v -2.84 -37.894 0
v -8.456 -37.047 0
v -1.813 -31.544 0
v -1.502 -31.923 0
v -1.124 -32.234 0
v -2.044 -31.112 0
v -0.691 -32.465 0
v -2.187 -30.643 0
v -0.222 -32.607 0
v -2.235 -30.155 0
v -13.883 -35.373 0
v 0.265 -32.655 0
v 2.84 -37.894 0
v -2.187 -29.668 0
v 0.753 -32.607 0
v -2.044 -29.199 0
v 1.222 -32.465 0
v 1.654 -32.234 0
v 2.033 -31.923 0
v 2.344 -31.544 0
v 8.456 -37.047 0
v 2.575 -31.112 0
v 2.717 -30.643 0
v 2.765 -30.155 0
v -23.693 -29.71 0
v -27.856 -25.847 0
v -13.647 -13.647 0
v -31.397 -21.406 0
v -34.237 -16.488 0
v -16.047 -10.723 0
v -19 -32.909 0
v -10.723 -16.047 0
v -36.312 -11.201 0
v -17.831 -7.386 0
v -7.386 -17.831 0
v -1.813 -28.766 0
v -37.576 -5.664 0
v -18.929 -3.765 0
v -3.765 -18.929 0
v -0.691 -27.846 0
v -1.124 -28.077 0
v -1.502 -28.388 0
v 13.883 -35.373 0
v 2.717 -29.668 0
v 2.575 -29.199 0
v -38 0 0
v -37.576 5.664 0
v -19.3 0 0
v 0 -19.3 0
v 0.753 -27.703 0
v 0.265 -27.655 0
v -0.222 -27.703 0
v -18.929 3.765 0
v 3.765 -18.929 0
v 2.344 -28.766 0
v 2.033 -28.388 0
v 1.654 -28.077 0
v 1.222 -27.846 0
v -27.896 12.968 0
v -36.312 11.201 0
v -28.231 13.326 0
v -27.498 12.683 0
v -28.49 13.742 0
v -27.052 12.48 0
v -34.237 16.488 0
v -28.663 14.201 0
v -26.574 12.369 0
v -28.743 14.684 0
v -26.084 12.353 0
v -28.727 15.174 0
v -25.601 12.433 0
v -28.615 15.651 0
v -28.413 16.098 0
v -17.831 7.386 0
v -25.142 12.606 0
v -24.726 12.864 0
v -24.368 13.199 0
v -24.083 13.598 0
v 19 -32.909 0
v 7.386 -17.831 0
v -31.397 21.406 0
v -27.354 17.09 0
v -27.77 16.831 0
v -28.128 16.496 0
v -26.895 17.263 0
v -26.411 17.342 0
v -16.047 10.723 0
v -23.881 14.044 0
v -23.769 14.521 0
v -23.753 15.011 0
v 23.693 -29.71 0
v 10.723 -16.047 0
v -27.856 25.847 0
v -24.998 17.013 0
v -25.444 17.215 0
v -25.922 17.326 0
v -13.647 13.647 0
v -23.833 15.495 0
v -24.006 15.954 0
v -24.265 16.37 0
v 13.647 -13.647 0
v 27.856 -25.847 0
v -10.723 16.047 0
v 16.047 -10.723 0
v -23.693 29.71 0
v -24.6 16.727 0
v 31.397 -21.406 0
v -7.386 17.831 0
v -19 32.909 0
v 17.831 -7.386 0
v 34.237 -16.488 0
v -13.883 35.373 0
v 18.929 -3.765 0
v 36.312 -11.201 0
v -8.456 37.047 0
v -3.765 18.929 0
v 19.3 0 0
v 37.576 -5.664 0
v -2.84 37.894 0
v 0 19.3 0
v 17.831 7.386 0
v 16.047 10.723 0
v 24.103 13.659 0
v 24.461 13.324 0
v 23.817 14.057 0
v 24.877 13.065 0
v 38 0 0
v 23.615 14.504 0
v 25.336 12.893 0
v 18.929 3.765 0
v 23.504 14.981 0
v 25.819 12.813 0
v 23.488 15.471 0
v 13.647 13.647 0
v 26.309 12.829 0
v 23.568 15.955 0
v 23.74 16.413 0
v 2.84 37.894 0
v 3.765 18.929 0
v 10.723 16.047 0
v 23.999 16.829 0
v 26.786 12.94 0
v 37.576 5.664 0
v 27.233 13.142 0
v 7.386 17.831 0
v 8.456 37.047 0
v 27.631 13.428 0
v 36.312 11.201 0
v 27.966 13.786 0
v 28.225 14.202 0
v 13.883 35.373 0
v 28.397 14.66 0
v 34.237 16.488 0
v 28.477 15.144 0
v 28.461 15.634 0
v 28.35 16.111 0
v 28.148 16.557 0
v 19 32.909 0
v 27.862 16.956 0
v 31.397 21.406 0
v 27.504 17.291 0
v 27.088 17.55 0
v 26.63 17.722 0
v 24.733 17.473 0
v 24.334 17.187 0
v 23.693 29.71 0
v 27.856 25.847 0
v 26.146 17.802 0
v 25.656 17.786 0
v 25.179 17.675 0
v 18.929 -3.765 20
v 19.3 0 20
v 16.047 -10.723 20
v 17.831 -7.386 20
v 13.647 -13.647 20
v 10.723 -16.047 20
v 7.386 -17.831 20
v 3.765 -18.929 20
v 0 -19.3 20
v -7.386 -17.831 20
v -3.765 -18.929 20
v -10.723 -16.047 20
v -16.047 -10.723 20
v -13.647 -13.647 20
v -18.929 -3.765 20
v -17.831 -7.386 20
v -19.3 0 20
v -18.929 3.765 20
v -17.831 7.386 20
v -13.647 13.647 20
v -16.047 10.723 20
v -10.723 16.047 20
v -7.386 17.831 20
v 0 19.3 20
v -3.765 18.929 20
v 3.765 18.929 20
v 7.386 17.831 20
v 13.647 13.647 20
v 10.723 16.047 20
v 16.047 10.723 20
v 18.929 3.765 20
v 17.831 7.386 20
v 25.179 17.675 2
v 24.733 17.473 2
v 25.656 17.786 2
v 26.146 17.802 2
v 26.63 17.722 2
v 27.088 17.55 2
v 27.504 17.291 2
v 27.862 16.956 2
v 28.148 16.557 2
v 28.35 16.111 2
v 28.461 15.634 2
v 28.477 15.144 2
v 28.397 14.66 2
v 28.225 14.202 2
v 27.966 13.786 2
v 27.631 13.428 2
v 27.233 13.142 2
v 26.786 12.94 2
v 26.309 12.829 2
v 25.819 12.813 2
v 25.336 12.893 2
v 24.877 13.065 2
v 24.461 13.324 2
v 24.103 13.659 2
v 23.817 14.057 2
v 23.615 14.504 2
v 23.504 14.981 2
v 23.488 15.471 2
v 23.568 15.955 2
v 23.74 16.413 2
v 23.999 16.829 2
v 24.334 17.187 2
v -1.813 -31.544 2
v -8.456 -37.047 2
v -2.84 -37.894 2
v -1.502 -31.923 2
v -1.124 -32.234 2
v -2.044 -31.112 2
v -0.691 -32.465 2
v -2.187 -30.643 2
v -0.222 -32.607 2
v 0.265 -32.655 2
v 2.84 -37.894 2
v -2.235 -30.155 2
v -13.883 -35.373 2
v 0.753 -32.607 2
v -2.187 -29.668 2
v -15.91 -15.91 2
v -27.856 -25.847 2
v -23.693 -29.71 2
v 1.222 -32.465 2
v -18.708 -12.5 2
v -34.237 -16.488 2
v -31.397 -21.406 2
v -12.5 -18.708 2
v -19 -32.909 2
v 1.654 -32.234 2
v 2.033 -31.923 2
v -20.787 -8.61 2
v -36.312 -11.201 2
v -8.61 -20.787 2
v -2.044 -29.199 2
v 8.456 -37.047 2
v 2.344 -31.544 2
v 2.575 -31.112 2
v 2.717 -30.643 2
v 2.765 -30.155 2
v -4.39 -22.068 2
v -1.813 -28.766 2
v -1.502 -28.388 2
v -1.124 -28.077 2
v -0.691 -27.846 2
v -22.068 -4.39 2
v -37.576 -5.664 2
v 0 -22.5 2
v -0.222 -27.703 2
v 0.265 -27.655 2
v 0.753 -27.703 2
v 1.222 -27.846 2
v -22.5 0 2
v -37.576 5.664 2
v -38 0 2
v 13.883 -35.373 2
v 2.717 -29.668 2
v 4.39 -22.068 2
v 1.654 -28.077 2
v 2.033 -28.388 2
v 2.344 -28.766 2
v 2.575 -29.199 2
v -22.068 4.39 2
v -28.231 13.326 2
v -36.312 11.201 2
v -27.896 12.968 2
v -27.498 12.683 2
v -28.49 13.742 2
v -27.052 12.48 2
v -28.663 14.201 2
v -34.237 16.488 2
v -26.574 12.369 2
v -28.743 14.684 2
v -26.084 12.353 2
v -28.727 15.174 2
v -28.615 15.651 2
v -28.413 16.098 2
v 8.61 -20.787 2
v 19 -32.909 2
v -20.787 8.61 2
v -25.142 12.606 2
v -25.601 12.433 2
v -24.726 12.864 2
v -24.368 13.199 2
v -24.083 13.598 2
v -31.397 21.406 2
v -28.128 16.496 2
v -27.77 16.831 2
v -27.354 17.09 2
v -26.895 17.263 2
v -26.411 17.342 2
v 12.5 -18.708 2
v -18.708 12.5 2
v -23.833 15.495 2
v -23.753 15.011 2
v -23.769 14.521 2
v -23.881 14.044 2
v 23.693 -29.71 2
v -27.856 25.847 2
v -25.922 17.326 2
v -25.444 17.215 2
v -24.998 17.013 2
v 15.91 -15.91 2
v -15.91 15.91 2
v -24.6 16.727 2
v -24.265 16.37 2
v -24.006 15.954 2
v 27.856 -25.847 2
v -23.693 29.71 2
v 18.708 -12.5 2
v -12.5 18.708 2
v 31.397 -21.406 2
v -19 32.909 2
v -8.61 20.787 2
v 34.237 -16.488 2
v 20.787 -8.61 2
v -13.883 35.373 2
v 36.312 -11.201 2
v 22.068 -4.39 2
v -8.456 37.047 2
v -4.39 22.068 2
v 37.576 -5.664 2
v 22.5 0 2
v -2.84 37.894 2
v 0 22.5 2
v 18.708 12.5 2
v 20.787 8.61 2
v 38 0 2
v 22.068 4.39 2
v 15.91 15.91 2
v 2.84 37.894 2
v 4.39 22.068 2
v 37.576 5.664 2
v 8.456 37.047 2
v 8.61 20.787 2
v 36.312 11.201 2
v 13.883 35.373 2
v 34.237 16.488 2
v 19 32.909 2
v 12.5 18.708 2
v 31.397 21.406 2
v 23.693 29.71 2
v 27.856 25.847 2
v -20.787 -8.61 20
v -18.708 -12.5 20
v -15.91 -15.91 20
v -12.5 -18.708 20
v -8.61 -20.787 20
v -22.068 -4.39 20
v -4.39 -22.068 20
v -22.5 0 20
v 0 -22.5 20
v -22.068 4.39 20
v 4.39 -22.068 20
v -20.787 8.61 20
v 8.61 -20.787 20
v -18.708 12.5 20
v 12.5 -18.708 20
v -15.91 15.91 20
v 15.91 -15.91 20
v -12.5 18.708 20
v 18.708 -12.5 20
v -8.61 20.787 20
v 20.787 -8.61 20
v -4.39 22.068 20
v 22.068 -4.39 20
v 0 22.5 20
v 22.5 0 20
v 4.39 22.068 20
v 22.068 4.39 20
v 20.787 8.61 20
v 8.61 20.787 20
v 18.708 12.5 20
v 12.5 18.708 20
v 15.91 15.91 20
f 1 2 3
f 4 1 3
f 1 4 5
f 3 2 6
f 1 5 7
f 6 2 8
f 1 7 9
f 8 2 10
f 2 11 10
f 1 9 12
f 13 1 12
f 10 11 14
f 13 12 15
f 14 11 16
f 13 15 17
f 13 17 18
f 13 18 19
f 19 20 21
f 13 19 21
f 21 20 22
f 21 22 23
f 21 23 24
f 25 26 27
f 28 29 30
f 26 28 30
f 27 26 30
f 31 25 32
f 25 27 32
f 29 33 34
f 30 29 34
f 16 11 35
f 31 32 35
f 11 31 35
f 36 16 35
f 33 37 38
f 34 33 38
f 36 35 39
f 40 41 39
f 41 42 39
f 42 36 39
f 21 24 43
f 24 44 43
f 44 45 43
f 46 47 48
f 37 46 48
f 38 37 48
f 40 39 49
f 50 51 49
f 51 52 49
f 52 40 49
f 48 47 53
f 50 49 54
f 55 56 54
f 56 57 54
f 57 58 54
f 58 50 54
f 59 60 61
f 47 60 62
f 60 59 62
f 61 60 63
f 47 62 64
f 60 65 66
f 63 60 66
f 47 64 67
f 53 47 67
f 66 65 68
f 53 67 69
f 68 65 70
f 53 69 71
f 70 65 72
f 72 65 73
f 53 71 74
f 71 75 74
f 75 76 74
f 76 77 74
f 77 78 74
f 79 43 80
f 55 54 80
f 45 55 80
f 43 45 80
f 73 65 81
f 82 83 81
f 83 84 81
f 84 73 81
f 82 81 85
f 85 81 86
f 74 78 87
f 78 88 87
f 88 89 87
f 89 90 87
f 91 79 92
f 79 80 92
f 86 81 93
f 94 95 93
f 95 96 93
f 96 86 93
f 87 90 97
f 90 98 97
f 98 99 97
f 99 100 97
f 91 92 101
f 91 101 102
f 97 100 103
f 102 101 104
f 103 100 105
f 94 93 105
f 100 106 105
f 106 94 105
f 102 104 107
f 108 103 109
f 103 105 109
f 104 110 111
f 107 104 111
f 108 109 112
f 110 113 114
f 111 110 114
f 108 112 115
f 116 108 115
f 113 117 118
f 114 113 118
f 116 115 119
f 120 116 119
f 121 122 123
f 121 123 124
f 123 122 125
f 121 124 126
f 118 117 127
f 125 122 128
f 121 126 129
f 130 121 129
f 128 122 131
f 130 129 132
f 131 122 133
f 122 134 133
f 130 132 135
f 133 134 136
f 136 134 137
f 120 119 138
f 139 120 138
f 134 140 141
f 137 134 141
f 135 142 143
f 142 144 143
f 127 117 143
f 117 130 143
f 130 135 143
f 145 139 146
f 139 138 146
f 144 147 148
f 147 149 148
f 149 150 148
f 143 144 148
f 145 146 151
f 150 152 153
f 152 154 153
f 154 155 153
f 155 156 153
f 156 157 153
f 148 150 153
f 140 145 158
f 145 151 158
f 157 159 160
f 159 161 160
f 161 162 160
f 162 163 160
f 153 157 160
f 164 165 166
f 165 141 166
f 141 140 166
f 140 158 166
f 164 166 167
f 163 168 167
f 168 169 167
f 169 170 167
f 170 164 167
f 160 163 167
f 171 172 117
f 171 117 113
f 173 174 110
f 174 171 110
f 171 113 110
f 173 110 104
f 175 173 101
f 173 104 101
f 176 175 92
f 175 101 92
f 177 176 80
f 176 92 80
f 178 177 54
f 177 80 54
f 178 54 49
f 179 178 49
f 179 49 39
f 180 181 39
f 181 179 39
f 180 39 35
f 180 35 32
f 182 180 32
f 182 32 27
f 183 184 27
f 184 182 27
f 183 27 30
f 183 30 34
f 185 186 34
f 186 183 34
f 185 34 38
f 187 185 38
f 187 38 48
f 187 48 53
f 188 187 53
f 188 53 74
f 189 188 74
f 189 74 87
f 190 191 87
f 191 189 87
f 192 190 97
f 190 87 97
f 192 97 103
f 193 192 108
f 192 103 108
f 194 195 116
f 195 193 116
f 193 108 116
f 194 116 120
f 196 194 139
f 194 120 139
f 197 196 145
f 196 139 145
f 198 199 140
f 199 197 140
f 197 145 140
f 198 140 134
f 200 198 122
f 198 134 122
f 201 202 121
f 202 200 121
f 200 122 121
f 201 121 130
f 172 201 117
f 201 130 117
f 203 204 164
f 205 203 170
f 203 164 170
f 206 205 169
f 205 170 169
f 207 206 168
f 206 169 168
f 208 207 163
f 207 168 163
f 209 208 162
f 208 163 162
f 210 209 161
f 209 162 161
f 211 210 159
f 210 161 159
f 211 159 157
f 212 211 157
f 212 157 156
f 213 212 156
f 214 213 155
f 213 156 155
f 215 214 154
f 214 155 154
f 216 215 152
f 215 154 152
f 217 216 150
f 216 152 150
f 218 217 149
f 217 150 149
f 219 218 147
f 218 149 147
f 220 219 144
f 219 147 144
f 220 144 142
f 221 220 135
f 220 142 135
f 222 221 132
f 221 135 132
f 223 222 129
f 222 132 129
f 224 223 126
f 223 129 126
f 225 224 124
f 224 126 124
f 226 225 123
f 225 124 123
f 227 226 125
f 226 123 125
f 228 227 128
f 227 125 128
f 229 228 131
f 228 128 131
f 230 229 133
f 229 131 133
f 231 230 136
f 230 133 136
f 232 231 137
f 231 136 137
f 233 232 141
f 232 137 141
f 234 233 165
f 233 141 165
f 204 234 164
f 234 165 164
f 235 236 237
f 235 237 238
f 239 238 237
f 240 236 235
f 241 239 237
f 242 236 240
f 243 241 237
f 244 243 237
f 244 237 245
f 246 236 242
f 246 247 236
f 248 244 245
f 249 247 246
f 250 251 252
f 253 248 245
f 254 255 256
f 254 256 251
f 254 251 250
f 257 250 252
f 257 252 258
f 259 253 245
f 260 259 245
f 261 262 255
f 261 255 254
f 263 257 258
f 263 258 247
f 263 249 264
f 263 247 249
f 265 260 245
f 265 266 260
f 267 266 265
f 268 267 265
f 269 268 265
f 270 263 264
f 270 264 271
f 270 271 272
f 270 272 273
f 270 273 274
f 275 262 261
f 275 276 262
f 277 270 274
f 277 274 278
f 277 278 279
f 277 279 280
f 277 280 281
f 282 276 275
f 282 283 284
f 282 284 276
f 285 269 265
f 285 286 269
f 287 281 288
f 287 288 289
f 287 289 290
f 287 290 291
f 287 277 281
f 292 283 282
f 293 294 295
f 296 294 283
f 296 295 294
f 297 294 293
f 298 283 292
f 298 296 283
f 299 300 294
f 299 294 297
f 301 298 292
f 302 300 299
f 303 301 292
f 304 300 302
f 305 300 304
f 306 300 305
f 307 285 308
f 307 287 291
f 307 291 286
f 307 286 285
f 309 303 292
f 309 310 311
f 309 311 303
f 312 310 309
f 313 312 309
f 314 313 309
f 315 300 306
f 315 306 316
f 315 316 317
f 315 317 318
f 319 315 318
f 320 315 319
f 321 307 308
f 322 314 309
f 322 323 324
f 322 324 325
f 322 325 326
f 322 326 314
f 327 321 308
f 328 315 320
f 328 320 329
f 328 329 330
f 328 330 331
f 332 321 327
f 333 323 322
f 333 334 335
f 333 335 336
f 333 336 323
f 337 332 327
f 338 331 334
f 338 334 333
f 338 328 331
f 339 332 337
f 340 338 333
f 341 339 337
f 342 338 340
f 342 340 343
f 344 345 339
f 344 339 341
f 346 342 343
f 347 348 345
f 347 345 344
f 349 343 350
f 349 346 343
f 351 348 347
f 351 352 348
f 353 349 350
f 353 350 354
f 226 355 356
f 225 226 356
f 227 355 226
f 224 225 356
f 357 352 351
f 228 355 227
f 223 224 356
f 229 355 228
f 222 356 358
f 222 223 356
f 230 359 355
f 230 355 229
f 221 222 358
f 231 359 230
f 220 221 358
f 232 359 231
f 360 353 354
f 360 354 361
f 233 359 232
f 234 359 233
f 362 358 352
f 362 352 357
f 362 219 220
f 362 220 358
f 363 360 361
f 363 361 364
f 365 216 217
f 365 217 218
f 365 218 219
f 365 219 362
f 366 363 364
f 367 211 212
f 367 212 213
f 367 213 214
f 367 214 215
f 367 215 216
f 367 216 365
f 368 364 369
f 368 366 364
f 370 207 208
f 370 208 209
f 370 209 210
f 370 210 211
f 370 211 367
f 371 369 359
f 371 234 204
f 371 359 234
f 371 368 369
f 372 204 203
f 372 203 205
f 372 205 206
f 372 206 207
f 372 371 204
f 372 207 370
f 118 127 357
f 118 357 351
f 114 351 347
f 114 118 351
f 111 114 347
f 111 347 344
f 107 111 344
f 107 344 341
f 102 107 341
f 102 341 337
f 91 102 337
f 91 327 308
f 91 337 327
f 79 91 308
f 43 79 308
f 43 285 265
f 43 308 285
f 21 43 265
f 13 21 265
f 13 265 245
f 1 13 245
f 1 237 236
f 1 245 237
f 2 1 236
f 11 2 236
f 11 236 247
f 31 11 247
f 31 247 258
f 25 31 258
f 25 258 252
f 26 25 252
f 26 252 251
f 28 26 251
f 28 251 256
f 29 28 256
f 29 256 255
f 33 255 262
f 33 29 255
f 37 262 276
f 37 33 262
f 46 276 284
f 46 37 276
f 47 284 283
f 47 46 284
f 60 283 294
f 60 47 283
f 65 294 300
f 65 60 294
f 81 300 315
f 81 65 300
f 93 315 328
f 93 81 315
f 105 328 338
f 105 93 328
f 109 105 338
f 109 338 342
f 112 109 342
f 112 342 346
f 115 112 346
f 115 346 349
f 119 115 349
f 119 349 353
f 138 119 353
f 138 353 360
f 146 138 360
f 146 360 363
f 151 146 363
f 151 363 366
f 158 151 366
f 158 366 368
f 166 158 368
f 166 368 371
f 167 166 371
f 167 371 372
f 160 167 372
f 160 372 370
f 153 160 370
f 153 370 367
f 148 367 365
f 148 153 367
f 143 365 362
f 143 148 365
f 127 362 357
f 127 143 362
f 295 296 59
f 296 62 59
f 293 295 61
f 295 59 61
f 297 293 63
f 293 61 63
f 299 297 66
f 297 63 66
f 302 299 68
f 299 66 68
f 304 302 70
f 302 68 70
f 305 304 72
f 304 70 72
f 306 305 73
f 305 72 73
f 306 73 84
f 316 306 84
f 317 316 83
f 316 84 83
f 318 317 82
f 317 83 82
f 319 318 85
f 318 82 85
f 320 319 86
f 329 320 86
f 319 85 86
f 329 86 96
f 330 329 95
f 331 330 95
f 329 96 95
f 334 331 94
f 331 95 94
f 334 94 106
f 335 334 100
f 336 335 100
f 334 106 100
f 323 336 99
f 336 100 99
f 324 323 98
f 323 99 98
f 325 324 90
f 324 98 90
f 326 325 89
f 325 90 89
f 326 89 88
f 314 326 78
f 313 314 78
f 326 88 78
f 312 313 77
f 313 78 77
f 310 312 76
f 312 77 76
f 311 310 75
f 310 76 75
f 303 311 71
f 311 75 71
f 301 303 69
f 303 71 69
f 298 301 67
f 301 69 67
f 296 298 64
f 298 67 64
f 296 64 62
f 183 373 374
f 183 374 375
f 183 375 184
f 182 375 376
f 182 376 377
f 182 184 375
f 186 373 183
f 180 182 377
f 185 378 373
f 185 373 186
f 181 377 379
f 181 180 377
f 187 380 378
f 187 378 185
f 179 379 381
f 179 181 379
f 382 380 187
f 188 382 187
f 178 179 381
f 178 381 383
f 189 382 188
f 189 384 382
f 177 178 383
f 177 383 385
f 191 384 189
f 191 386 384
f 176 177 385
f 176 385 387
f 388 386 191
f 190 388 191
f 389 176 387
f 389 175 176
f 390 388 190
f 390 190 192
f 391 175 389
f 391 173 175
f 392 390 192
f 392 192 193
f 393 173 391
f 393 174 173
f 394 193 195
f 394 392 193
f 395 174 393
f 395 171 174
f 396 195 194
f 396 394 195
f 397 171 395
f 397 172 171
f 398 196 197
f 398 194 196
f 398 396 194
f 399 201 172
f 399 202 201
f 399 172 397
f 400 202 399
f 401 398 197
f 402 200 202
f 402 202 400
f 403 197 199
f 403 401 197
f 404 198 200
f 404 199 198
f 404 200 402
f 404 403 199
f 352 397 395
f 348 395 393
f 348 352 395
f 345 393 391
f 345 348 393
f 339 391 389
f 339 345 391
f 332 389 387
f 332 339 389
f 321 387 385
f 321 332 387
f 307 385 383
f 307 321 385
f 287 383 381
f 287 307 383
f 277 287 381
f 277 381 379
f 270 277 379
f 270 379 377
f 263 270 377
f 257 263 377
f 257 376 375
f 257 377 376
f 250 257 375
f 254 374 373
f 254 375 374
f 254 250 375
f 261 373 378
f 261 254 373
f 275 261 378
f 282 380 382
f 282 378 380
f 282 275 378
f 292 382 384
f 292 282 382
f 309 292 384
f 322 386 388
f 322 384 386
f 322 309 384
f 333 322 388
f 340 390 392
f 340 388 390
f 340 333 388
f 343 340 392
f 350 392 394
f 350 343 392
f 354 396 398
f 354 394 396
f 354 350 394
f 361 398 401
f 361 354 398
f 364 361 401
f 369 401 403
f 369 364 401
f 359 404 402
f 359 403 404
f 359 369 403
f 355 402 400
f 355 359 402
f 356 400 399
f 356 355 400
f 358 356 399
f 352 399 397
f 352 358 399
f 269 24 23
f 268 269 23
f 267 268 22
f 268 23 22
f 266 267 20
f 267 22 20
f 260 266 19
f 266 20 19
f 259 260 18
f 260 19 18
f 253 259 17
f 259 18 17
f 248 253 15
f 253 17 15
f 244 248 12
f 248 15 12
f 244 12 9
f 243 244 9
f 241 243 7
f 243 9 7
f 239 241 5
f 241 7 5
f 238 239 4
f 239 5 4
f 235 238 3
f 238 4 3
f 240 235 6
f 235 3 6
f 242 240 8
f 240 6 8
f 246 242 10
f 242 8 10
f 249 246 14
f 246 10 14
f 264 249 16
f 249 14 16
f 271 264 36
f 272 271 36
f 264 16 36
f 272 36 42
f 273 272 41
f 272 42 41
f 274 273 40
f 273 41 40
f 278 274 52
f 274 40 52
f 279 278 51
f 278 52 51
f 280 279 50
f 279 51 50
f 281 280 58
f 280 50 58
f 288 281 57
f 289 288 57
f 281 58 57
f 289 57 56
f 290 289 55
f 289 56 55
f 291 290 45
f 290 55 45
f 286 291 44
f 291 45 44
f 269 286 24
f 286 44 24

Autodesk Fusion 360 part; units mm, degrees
sketch "Sketch1" plane through (0, 0, 0) normal (0, 0, 1) x (1, 0, 0)
  circle A0 centre (0, 0) radius 19.3
  circle A1 centre (0, 0) radius 22.5
  circle A2 centre (0, 0) radius 38
  dimension "d1" = 45
  dimension "d2" = 38.6
  dimension "d3" = 76
extrude "Extrude1" add sketch "Sketch1" along normal blind 20 contours A1
sketch "Sketch2" plane through (0, 0, 0) normal (0, 0, 1) x (1, 0, 0)
  circle A0 centre (0.2654, -30.1553) radius 2.5
  dimension "d8" = 5
extrude "Extrude4" add sketch "Sketch1" along normal blind 2 contours A1 | A2
extrude "Extrude5" cut sketch "Sketch2" along normal blind 6.312
pattern_circular "C-Pattern2" count 3 over 360 about axis through (0, 0, 2) along (0, 0, 1) of "Extrude5"
